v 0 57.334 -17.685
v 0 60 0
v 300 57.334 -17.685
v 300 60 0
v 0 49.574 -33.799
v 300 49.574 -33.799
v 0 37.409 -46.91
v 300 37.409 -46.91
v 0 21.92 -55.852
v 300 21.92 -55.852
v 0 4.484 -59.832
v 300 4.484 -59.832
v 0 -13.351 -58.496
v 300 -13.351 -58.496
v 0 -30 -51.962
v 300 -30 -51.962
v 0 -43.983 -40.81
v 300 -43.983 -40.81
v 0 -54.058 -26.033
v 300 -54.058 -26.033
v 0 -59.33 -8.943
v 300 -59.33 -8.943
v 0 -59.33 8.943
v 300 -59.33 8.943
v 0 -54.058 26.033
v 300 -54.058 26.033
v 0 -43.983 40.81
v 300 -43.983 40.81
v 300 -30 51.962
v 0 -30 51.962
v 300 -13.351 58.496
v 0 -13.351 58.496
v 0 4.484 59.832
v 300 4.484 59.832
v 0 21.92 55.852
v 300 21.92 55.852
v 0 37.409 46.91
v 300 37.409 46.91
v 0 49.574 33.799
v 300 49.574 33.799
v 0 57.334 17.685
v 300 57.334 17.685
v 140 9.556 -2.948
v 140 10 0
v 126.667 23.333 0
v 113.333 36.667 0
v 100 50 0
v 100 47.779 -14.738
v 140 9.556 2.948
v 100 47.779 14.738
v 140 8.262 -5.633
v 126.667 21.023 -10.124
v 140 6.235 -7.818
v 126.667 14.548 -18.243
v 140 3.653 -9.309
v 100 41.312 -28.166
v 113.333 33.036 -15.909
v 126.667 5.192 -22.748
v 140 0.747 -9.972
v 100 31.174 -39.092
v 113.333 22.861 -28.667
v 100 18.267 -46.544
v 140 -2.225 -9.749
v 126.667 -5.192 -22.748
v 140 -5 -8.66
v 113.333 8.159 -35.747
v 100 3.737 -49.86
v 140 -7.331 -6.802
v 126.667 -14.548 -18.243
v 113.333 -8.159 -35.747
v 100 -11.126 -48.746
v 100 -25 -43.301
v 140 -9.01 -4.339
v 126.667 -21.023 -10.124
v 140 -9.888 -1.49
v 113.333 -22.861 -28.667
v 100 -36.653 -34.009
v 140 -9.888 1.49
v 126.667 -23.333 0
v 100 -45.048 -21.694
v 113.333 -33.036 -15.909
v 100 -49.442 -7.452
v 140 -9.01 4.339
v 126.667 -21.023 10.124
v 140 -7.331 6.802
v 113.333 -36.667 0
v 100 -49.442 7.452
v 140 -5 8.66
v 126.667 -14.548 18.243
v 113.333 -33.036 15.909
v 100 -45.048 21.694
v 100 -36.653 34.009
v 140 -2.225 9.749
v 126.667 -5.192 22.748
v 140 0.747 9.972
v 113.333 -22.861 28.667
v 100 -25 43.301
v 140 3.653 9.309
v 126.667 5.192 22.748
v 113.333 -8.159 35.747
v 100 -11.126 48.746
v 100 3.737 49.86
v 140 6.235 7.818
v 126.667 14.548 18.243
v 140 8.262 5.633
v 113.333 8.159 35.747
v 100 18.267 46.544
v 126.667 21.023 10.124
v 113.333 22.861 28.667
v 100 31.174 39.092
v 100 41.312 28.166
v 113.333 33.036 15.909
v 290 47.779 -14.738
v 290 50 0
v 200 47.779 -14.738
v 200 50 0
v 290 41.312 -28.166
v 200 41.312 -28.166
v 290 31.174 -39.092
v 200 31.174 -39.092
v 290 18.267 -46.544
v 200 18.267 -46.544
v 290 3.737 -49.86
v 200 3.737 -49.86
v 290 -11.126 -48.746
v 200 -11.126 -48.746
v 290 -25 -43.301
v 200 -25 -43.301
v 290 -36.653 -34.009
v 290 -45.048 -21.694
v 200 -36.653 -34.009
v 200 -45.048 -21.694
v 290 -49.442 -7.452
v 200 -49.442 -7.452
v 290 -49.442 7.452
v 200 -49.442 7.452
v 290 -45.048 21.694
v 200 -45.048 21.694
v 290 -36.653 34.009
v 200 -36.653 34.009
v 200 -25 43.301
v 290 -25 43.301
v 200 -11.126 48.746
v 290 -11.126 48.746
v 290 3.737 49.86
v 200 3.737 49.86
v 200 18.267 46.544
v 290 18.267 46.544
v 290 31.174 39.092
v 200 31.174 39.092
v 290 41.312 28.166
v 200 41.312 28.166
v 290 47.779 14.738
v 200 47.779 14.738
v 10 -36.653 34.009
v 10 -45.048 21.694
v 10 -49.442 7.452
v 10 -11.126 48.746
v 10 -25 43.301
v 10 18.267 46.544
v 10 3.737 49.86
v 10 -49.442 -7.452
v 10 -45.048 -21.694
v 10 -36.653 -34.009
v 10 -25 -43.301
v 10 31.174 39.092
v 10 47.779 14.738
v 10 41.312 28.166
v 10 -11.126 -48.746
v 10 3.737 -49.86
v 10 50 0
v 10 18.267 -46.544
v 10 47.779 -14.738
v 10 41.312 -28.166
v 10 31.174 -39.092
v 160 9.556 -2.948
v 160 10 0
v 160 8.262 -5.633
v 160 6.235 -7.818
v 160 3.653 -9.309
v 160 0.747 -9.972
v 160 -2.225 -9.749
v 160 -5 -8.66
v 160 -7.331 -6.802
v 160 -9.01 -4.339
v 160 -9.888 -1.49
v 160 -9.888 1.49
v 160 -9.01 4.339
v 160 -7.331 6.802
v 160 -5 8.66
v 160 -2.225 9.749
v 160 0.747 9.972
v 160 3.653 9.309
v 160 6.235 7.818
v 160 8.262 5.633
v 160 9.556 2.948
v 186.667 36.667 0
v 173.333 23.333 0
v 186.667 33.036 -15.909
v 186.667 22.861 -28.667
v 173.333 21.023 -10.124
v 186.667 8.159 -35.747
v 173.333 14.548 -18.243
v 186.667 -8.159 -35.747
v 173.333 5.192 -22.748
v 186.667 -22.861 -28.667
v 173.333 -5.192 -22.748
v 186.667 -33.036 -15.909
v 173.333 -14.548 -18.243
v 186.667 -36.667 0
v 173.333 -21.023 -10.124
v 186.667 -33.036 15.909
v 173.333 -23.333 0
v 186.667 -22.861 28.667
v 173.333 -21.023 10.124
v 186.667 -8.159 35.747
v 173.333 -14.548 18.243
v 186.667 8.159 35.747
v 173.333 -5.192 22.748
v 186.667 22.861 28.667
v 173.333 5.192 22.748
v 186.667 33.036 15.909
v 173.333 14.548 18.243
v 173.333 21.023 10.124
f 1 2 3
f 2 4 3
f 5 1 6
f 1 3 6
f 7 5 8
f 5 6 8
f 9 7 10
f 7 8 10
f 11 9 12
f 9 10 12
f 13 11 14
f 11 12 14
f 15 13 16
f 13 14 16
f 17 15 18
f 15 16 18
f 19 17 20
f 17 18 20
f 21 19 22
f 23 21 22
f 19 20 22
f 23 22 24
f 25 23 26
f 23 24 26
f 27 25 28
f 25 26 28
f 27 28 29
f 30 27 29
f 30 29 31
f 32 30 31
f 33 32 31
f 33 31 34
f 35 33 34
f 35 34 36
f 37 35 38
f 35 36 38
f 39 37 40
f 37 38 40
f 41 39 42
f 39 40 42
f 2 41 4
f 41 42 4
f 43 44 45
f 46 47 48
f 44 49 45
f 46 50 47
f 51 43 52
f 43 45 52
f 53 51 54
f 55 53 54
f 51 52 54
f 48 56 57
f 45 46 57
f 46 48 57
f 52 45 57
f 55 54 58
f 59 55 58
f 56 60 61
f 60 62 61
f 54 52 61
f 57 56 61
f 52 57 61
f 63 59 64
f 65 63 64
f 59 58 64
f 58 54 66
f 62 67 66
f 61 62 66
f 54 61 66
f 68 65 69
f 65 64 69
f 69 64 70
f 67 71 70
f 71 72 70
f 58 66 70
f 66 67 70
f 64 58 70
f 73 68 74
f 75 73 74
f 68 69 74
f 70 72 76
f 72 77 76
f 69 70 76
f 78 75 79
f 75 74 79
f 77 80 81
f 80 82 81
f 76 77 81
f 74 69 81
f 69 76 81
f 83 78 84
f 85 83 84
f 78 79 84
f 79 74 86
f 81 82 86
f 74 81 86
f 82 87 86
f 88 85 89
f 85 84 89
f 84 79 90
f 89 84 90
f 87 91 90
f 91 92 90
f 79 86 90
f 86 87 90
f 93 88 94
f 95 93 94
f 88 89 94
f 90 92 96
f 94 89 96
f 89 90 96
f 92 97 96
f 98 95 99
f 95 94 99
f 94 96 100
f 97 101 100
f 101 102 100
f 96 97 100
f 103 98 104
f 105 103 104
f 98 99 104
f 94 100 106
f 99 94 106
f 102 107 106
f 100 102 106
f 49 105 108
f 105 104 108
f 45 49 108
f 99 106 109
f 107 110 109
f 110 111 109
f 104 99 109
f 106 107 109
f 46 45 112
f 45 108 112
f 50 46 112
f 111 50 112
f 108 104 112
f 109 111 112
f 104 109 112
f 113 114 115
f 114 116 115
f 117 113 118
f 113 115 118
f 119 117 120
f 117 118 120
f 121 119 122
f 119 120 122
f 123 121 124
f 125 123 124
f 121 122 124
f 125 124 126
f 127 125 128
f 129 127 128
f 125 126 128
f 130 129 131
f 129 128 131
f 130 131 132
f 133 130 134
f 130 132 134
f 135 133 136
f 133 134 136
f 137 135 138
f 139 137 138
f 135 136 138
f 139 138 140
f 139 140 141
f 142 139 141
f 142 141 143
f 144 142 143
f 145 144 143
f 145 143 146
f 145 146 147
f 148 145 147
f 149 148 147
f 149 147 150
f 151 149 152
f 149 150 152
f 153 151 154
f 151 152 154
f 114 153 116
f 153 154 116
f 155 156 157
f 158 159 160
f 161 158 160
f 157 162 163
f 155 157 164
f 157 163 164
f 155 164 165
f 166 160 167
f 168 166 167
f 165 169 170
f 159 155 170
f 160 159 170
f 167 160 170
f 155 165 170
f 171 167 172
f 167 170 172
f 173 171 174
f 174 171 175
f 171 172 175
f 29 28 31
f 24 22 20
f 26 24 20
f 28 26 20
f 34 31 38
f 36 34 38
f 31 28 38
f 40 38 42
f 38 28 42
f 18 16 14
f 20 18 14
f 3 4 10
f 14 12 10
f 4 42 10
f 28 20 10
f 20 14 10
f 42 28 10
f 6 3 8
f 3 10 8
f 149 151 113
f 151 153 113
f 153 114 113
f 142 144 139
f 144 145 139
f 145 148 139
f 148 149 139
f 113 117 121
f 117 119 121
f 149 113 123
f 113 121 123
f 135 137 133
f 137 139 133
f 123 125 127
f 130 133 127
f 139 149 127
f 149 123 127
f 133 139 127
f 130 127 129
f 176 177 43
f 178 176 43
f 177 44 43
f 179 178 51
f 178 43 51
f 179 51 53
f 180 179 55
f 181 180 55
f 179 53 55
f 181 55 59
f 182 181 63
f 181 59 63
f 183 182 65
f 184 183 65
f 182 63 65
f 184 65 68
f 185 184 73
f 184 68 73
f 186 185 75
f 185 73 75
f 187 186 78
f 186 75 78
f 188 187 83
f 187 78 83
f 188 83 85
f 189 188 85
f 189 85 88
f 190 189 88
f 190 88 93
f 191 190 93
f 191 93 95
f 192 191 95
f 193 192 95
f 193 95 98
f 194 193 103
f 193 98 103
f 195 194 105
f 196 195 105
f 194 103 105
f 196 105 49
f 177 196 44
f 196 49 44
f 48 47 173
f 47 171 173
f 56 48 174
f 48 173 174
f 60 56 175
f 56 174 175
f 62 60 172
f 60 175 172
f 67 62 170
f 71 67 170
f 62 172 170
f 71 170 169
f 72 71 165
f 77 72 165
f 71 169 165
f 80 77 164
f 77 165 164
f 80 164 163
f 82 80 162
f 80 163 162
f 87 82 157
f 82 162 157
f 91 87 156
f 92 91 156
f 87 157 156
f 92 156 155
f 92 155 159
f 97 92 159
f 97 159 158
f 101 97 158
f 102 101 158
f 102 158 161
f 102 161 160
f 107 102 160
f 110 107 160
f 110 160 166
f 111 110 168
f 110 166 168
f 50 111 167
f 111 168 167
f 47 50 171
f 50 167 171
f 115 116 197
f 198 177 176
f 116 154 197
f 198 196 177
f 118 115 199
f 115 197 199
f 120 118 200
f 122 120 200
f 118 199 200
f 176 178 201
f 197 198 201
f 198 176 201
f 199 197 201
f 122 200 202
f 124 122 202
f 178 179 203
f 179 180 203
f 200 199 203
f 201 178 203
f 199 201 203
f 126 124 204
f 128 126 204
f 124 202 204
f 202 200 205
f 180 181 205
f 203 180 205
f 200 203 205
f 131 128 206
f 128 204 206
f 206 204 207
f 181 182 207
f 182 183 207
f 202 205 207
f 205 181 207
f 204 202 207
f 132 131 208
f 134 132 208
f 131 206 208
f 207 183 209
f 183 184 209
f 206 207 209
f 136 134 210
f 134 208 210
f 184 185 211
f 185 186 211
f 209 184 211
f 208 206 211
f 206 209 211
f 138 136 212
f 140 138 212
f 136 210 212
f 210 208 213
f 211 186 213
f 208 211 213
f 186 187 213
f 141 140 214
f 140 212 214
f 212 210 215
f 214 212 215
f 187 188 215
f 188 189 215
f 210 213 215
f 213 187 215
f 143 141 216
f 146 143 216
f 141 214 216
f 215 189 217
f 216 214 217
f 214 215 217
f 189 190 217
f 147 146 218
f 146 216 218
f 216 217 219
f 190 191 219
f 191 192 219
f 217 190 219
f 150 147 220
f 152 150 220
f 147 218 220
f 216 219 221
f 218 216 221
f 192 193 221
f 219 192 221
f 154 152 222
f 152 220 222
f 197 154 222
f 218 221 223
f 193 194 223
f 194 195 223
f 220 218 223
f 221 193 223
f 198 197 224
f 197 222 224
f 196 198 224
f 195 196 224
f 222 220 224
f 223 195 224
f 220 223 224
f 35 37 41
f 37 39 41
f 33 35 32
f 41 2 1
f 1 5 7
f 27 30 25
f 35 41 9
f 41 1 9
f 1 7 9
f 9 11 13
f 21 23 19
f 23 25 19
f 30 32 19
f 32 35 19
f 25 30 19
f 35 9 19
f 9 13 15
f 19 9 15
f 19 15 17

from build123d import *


with BuildPart() as part:
    # ｽｹｯﾁ1 → 回転1 (revolve)
    with BuildSketch(Plane.XY, mode=Mode.PRIVATE) as revolve_1_sk:
        Polygon((10, 0), (0, 0), (0, -60), (150, -60), (150, -10), (140, -10), (100, -50), (10, -50), align=None)
        Polygon((150, -10), (150, -60), (300, -60), (300, 0), (290, 0), (290, -50), (200, -50), (160, -10), align=None)
    revolve(revolve_1_sk.sketch.rotate(Axis((10, 0, 0), (-1, 0, 0)), 180), axis=Axis((10, 0, 0), (-1, 0, 0)))


solid = part.part
